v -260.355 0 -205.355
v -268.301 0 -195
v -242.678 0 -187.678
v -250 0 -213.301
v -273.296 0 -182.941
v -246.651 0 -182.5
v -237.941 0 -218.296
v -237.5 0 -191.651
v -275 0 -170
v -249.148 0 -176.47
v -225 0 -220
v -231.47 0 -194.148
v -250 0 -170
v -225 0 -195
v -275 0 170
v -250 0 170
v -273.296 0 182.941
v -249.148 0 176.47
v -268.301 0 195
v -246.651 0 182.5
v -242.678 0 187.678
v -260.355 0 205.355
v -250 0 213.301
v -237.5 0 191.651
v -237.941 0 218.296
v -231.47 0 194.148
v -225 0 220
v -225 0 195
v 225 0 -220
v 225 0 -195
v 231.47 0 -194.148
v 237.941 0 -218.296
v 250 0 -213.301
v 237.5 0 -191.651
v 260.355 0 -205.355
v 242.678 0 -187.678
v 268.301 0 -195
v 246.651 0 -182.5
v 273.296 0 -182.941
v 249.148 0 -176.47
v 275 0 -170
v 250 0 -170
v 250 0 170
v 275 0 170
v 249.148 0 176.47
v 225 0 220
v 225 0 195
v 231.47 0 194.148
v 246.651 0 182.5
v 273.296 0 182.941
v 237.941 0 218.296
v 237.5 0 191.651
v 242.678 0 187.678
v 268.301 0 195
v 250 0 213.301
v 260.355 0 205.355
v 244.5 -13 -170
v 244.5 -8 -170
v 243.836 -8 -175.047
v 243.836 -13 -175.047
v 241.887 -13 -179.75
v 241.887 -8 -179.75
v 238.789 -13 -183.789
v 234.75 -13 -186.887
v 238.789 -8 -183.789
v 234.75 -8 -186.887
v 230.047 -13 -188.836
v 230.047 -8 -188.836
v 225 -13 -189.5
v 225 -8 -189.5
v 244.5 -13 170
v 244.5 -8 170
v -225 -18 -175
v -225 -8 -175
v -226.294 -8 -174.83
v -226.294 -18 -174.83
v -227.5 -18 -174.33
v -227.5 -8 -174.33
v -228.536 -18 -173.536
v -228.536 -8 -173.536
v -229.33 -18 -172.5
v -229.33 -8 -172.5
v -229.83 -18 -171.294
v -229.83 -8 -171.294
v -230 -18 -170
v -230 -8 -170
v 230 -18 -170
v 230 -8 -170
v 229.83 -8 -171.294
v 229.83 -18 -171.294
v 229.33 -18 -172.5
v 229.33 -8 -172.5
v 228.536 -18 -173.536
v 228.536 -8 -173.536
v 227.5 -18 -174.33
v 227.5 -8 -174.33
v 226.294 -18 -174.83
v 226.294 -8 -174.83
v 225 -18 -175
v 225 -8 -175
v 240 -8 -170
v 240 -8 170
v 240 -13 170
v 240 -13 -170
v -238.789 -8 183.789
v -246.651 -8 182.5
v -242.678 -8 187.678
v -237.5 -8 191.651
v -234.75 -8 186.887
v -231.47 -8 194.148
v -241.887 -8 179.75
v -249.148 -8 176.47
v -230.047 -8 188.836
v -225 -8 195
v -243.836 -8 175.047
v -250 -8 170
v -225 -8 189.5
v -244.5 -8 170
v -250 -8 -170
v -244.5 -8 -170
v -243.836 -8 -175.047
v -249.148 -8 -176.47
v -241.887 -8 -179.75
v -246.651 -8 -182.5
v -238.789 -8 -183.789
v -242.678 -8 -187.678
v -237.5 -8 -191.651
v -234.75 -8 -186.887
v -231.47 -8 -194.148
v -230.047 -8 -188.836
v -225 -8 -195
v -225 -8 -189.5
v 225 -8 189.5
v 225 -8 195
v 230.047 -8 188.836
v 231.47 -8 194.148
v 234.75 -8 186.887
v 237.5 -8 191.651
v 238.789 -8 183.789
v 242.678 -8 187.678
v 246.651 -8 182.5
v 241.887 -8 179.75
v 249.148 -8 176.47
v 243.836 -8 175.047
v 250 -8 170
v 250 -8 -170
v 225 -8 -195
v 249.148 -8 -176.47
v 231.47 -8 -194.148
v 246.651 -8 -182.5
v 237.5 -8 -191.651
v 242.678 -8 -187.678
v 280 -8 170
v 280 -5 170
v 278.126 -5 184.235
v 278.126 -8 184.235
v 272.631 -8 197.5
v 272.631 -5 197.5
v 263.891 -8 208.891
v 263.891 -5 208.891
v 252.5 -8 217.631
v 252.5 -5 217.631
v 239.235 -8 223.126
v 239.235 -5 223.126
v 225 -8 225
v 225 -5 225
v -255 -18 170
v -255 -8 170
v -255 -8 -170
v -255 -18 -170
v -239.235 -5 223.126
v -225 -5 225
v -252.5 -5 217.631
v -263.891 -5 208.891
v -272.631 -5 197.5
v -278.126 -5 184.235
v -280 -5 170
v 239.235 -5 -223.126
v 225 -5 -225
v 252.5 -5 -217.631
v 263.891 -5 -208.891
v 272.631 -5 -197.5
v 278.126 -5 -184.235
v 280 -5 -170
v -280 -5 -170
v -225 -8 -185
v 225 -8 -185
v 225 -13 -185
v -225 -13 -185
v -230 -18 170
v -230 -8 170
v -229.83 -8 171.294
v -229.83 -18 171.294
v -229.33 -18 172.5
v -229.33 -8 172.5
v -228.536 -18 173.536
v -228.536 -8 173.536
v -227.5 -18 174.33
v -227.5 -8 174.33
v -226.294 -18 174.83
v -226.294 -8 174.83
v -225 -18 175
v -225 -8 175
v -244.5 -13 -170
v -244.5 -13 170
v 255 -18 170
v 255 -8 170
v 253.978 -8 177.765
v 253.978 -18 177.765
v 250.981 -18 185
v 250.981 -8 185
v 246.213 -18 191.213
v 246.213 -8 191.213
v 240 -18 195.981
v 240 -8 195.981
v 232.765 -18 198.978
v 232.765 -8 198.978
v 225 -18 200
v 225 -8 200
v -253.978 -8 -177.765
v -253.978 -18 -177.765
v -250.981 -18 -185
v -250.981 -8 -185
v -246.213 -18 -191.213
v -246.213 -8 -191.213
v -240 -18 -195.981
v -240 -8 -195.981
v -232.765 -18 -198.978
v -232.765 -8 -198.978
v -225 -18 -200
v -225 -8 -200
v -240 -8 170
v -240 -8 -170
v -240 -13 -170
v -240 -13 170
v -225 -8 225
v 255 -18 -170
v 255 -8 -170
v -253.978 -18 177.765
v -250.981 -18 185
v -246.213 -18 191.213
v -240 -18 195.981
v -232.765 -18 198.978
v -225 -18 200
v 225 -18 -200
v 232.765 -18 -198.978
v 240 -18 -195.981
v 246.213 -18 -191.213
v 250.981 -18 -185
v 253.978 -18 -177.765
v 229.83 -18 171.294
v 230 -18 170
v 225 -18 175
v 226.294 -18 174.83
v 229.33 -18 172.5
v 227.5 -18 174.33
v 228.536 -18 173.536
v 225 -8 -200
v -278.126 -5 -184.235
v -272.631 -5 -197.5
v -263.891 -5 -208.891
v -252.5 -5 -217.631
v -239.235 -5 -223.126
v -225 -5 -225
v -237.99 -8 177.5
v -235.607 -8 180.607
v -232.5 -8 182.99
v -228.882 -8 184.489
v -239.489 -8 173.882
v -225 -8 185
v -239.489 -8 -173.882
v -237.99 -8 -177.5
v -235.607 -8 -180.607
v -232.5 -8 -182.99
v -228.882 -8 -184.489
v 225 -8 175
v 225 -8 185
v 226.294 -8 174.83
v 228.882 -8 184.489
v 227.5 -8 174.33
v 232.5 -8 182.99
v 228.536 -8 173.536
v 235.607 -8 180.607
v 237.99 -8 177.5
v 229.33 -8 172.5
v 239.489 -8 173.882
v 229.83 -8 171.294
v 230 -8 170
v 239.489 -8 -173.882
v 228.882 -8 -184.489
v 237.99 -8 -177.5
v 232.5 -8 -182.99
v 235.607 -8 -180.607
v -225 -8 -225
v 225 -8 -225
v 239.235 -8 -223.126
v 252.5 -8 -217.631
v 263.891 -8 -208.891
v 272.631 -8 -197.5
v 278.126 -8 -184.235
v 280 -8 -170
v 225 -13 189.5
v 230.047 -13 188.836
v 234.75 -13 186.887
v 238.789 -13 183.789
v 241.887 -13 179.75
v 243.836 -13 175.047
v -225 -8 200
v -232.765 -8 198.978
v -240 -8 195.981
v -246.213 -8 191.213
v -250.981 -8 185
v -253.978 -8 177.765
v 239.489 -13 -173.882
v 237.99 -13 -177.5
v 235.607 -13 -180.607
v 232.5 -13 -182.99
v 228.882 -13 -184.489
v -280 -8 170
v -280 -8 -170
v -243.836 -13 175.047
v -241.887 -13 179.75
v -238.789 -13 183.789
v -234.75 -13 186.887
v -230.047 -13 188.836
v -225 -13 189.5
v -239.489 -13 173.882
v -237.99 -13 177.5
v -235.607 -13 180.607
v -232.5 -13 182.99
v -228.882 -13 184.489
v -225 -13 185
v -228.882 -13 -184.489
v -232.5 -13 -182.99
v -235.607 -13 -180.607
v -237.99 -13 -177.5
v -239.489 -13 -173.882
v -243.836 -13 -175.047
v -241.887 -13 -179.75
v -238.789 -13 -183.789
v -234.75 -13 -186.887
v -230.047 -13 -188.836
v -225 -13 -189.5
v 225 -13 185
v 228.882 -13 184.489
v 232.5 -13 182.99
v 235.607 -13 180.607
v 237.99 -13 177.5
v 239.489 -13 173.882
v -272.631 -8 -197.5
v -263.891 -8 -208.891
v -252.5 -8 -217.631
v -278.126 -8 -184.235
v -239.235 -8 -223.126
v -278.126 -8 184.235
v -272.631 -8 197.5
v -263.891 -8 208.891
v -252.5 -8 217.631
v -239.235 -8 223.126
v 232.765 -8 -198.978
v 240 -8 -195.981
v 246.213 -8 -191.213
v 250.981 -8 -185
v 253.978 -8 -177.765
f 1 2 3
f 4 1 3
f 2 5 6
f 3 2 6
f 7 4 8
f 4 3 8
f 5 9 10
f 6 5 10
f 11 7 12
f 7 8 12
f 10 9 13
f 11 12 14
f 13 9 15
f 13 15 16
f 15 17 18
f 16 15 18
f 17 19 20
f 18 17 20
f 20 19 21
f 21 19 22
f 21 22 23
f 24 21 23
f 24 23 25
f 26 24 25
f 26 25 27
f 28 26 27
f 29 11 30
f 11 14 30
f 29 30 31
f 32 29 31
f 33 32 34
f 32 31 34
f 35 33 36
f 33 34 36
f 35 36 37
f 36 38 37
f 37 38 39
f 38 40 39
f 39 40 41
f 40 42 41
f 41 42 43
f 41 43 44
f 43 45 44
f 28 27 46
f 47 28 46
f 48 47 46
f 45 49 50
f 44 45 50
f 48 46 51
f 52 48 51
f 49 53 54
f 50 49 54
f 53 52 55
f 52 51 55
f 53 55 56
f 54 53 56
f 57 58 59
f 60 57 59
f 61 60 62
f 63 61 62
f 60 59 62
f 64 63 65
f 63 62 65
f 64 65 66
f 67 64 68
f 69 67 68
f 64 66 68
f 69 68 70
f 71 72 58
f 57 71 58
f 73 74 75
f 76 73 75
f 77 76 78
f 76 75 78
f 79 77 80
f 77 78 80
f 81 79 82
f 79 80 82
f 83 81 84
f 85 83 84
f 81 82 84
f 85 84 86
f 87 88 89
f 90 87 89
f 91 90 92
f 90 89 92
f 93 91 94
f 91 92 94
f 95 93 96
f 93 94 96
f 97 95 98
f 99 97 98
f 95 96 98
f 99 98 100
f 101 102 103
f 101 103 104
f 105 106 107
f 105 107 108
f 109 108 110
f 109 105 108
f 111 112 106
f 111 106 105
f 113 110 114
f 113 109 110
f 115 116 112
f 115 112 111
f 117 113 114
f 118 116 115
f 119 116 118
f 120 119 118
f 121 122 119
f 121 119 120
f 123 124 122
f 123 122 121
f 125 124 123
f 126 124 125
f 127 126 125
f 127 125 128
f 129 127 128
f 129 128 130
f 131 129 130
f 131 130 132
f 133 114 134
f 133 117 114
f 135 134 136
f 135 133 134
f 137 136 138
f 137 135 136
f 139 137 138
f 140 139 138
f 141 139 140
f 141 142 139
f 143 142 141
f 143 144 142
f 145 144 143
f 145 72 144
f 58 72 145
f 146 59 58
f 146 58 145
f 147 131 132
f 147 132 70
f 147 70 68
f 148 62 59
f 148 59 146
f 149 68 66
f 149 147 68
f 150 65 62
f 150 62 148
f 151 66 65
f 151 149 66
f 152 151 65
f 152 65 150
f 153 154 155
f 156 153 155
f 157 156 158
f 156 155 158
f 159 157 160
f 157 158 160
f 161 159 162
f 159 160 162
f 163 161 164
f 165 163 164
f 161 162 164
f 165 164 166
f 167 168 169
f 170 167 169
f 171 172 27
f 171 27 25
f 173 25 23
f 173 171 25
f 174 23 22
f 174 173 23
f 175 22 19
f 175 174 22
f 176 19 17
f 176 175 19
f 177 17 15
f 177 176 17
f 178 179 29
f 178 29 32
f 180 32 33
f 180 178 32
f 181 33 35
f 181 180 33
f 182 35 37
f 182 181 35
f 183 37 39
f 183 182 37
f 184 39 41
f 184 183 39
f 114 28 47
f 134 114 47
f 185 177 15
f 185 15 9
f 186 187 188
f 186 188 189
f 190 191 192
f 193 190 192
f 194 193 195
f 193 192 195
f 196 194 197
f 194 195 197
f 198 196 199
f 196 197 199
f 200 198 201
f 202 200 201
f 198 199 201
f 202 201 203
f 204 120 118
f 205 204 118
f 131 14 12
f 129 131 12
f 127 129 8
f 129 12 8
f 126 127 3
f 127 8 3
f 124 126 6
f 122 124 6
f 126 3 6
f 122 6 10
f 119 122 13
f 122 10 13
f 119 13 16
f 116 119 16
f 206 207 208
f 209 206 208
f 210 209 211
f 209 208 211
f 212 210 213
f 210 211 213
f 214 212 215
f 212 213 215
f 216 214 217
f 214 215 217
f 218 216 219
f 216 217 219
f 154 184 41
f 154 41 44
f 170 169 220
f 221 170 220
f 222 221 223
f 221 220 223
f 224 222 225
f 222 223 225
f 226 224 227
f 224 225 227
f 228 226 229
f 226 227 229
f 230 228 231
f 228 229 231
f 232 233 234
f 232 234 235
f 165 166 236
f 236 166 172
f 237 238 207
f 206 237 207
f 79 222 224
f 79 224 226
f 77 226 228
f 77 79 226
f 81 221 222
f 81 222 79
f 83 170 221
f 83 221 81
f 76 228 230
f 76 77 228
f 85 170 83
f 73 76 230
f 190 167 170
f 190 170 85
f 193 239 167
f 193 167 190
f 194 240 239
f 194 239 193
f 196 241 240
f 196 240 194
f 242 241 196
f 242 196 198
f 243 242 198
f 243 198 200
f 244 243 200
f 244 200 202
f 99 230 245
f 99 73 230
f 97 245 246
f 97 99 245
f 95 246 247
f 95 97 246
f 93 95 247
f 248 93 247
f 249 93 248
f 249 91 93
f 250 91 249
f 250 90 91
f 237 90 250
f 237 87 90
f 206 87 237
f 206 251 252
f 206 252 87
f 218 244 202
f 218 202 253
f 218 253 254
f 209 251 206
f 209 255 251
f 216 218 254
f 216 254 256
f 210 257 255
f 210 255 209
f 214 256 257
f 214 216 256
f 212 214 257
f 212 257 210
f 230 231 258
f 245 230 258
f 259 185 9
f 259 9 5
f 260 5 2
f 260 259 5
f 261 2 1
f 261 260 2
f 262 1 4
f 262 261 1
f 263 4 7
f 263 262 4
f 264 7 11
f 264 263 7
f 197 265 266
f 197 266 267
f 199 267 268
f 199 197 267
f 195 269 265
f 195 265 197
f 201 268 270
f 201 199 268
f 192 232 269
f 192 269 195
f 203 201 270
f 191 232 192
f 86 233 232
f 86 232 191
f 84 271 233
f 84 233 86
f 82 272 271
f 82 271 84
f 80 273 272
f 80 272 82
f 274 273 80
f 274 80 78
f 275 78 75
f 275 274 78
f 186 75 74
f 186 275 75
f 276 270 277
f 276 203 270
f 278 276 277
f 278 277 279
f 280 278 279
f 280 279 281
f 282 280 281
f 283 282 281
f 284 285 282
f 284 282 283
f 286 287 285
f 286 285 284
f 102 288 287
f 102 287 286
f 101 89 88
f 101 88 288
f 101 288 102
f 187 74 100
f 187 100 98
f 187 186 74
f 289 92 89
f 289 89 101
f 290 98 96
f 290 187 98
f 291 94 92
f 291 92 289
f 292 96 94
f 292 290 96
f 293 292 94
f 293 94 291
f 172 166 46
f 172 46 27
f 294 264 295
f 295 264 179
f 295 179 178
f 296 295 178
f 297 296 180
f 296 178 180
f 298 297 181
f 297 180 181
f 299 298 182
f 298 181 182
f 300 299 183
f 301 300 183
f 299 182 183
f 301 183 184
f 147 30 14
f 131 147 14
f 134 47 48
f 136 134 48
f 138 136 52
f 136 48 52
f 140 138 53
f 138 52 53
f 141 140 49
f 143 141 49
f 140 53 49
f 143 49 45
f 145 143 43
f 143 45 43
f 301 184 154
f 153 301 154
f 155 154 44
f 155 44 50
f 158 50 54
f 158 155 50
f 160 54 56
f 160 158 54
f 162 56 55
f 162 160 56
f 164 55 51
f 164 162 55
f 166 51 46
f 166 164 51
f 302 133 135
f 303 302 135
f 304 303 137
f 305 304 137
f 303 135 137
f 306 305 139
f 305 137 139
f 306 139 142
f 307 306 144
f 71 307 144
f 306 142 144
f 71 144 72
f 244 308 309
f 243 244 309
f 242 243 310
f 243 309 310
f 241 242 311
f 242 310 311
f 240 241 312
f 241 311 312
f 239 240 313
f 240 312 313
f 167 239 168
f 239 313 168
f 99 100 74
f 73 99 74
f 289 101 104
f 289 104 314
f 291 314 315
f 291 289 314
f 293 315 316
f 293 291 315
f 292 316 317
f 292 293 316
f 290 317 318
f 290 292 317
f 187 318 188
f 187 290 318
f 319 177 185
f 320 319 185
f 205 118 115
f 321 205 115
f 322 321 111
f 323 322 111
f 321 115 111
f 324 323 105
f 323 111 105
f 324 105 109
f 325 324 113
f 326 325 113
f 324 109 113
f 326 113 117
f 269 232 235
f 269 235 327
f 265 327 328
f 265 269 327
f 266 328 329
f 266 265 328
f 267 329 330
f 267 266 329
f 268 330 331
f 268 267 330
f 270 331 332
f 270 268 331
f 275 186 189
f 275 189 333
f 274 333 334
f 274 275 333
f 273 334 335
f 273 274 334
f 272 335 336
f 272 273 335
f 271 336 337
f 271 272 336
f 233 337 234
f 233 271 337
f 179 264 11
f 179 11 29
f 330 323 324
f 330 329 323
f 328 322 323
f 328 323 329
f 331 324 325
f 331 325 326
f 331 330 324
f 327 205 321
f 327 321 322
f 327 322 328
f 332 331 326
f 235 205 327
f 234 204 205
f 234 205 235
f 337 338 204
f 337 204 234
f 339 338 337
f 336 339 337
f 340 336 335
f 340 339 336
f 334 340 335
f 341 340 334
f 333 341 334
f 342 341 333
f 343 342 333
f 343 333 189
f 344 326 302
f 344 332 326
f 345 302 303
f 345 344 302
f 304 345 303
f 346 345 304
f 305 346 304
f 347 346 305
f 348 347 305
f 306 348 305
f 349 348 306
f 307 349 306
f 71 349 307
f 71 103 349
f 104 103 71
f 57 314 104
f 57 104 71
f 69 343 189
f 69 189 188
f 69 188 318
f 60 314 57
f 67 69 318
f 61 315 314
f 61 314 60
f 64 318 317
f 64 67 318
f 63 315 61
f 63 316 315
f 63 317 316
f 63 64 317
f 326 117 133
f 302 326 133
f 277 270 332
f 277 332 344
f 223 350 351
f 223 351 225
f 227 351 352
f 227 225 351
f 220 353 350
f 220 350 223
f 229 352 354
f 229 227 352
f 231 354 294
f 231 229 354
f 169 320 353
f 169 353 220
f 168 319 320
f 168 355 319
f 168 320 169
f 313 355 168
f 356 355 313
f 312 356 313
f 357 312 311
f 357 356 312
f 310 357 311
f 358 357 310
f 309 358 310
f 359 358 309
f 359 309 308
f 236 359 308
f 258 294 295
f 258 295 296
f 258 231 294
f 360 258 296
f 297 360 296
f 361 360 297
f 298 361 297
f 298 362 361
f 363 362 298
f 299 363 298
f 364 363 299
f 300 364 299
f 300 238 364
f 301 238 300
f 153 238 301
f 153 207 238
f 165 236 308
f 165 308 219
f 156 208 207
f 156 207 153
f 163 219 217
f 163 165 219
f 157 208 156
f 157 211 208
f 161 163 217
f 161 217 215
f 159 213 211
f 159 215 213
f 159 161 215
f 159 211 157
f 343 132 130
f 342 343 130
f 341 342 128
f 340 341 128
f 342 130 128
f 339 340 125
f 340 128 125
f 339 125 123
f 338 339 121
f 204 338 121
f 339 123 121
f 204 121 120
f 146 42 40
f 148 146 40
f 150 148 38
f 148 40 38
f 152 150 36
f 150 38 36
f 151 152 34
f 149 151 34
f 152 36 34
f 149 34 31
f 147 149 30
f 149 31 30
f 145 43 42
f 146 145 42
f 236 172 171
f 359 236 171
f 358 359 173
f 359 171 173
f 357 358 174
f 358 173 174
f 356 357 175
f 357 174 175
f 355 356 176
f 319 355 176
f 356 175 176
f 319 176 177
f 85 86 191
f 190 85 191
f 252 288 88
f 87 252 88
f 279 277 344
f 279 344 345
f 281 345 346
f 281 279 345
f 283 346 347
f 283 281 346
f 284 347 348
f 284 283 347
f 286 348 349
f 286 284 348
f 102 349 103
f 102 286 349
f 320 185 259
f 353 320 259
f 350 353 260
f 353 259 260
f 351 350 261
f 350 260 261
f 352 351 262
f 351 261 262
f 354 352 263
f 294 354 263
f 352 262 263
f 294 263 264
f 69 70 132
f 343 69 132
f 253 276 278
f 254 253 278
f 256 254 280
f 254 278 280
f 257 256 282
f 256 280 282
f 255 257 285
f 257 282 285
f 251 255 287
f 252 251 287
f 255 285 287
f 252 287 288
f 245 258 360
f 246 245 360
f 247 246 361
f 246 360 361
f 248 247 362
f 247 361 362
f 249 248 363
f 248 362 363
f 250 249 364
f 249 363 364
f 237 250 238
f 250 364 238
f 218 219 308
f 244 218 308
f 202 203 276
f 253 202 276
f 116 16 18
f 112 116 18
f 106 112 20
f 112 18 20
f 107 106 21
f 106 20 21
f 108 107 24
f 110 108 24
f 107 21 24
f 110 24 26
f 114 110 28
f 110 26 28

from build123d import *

# Parameters (mm, degrees)
PAD_DEPTH       = 8
PAD001_DEPTH    = 10
POCKET_DEPTH    = 18
POCKET001_DEPTH = 8
POCKET002_DEPTH = 5
CHAMFER_SIZE    = 5


with BuildPart() as part:
    # Sketch → Pad (new body)
    with BuildSketch(Plane.XZ):
        with BuildLine():
            Line((-280, 170), (-280, -170))
            ThreePointArc((-280, -170), (-263.890873, -208.890873), (-225, -225))
            Line((-225, -225), (225, -225))
            ThreePointArc((225, -225), (263.890873, -208.890873), (280, -170))
            Line((280, -170), (280, 170))
            ThreePointArc((280, 170), (263.890873, 208.890873), (225, 225))
            Line((225, 225), (-225, 225))
            ThreePointArc((-225, 225), (-263.890873, 208.890873), (-280, 170))
        make_face()
    extrude(amount=PAD_DEPTH)

    # Sketch001 (on Face10 of Pad) → Pad001 (join)
    with BuildSketch(Plane.XZ.offset(8)):
        with BuildLine():
            Line((-255, 170), (-255, -170))
            ThreePointArc((-255, -170), (-246.213203, -191.213203), (-225, -200))
            Line((-225, -200), (225, -200))
            ThreePointArc((225, -200), (246.213203, -191.213203), (255, -170))
            Line((255, -170), (255, 170))
            ThreePointArc((255, 170), (246.213203, 191.213203), (225, 200))
            Line((225, 200), (-225, 200))
            ThreePointArc((-225, 200), (-246.213203, 191.213203), (-255, 170))
        make_face()
    extrude(amount=PAD001_DEPTH)

    # Sketch002 (on Face4 of Pad001) → Pocket (cut)
    with BuildSketch(Plane(origin=(0, 0, 0), x_dir=(1, 0, 0), z_dir=(0, 1, 0))):
        with BuildLine():
            Line((-230, 170), (-230, -170))
            ThreePointArc((-230, -170), (-228.535534, -173.535534), (-225, -175))
            Line((-225, -175), (225, -175))
            ThreePointArc((225, -175), (228.535534, -173.535534), (230, -170))
            Line((230, -170), (230, 170))
            ThreePointArc((230, 170), (228.535534, 173.535534), (225, 175))
            Line((225, 175), (-225, 175))
            ThreePointArc((-225, 175), (-228.535534, 173.535534), (-230, 170))
        make_face()
    extrude(amount=-POCKET_DEPTH, mode=Mode.SUBTRACT)

    # Sketch003 (on Face4 of Pocket) → Pocket001 (cut)
    with BuildSketch(Plane(origin=(0, 0, 0), x_dir=(1, 0, 0), z_dir=(0, 1, 0))):
        with BuildLine():
            Line((-250, 170), (-250, -170))
            ThreePointArc((-250, -170), (-242.67767, -187.67767), (-225, -195))
            Line((-225, -195), (225, -195))
            ThreePointArc((225, -195), (242.67767, -187.67767), (250, -170))
            Line((250, -170), (250, 170))
            ThreePointArc((250, 170), (242.67767, 187.67767), (225, 195))
            Line((225, 195), (-225, 195))
            ThreePointArc((-225, 195), (-242.67767, 187.67767), (-250, 170))
        make_face()
    extrude(amount=-POCKET001_DEPTH, mode=Mode.SUBTRACT)

    # Sketch004 (on Face27 of Pocket001) → Pocket002 (cut)
    with BuildSketch(Plane(origin=(0, -8, 0), x_dir=(1, 0, 0), z_dir=(0, 1, 0))):
        with BuildLine():
            Line((-244.5, 170), (-244.5, -170))
            ThreePointArc((-244.5, -170), (-238.788582, -183.788582), (-225, -189.5))
            Line((-225, -189.5), (225, -189.5))
            ThreePointArc((225, -189.5), (238.788582, -183.788582), (244.5, -170))
            Line((244.5, -170), (244.5, 170))
            ThreePointArc((244.5, 170), (238.788582, 183.788582), (225, 189.5))
            Line((225, 189.5), (-225, 189.5))
            ThreePointArc((-225, 189.5), (-238.788582, 183.788582), (-244.5, 170))
        make_face()
        with BuildLine():
            Line((-240, 170), (-240, -170))
            ThreePointArc((-240, -170), (-235.606602, -180.606602), (-225, -185))
            Line((-225, -185), (225, -185))
            ThreePointArc((225, -185), (235.606602, -180.606602), (240, -170))
            Line((240, -170), (240, 170))
            ThreePointArc((240, 170), (235.606602, 180.606602), (225, 185))
            Line((225, 185), (-225, 185))
            ThreePointArc((-225, 185), (-235.606602, 180.606602), (-240, 170))
        make_face(mode=Mode.SUBTRACT)
    extrude(amount=-POCKET002_DEPTH, mode=Mode.SUBTRACT)

    # Chamfer
    chamfer_edges = [part.edges().sort_by_distance(p)[0] for p in [
        (0, 0, 225),
        (-263.890873, 0, 208.890873),
        (-280, 0, 0),
        (-263.890873, 0, -208.890873),
        (0, 0, -225),
        (263.890873, 0, -208.890873),
        (280, 0, 0),
        (263.890873, 0, 208.890873),
    ]]
    chamfer(chamfer_edges, length=CHAMFER_SIZE)


solid = part.part
